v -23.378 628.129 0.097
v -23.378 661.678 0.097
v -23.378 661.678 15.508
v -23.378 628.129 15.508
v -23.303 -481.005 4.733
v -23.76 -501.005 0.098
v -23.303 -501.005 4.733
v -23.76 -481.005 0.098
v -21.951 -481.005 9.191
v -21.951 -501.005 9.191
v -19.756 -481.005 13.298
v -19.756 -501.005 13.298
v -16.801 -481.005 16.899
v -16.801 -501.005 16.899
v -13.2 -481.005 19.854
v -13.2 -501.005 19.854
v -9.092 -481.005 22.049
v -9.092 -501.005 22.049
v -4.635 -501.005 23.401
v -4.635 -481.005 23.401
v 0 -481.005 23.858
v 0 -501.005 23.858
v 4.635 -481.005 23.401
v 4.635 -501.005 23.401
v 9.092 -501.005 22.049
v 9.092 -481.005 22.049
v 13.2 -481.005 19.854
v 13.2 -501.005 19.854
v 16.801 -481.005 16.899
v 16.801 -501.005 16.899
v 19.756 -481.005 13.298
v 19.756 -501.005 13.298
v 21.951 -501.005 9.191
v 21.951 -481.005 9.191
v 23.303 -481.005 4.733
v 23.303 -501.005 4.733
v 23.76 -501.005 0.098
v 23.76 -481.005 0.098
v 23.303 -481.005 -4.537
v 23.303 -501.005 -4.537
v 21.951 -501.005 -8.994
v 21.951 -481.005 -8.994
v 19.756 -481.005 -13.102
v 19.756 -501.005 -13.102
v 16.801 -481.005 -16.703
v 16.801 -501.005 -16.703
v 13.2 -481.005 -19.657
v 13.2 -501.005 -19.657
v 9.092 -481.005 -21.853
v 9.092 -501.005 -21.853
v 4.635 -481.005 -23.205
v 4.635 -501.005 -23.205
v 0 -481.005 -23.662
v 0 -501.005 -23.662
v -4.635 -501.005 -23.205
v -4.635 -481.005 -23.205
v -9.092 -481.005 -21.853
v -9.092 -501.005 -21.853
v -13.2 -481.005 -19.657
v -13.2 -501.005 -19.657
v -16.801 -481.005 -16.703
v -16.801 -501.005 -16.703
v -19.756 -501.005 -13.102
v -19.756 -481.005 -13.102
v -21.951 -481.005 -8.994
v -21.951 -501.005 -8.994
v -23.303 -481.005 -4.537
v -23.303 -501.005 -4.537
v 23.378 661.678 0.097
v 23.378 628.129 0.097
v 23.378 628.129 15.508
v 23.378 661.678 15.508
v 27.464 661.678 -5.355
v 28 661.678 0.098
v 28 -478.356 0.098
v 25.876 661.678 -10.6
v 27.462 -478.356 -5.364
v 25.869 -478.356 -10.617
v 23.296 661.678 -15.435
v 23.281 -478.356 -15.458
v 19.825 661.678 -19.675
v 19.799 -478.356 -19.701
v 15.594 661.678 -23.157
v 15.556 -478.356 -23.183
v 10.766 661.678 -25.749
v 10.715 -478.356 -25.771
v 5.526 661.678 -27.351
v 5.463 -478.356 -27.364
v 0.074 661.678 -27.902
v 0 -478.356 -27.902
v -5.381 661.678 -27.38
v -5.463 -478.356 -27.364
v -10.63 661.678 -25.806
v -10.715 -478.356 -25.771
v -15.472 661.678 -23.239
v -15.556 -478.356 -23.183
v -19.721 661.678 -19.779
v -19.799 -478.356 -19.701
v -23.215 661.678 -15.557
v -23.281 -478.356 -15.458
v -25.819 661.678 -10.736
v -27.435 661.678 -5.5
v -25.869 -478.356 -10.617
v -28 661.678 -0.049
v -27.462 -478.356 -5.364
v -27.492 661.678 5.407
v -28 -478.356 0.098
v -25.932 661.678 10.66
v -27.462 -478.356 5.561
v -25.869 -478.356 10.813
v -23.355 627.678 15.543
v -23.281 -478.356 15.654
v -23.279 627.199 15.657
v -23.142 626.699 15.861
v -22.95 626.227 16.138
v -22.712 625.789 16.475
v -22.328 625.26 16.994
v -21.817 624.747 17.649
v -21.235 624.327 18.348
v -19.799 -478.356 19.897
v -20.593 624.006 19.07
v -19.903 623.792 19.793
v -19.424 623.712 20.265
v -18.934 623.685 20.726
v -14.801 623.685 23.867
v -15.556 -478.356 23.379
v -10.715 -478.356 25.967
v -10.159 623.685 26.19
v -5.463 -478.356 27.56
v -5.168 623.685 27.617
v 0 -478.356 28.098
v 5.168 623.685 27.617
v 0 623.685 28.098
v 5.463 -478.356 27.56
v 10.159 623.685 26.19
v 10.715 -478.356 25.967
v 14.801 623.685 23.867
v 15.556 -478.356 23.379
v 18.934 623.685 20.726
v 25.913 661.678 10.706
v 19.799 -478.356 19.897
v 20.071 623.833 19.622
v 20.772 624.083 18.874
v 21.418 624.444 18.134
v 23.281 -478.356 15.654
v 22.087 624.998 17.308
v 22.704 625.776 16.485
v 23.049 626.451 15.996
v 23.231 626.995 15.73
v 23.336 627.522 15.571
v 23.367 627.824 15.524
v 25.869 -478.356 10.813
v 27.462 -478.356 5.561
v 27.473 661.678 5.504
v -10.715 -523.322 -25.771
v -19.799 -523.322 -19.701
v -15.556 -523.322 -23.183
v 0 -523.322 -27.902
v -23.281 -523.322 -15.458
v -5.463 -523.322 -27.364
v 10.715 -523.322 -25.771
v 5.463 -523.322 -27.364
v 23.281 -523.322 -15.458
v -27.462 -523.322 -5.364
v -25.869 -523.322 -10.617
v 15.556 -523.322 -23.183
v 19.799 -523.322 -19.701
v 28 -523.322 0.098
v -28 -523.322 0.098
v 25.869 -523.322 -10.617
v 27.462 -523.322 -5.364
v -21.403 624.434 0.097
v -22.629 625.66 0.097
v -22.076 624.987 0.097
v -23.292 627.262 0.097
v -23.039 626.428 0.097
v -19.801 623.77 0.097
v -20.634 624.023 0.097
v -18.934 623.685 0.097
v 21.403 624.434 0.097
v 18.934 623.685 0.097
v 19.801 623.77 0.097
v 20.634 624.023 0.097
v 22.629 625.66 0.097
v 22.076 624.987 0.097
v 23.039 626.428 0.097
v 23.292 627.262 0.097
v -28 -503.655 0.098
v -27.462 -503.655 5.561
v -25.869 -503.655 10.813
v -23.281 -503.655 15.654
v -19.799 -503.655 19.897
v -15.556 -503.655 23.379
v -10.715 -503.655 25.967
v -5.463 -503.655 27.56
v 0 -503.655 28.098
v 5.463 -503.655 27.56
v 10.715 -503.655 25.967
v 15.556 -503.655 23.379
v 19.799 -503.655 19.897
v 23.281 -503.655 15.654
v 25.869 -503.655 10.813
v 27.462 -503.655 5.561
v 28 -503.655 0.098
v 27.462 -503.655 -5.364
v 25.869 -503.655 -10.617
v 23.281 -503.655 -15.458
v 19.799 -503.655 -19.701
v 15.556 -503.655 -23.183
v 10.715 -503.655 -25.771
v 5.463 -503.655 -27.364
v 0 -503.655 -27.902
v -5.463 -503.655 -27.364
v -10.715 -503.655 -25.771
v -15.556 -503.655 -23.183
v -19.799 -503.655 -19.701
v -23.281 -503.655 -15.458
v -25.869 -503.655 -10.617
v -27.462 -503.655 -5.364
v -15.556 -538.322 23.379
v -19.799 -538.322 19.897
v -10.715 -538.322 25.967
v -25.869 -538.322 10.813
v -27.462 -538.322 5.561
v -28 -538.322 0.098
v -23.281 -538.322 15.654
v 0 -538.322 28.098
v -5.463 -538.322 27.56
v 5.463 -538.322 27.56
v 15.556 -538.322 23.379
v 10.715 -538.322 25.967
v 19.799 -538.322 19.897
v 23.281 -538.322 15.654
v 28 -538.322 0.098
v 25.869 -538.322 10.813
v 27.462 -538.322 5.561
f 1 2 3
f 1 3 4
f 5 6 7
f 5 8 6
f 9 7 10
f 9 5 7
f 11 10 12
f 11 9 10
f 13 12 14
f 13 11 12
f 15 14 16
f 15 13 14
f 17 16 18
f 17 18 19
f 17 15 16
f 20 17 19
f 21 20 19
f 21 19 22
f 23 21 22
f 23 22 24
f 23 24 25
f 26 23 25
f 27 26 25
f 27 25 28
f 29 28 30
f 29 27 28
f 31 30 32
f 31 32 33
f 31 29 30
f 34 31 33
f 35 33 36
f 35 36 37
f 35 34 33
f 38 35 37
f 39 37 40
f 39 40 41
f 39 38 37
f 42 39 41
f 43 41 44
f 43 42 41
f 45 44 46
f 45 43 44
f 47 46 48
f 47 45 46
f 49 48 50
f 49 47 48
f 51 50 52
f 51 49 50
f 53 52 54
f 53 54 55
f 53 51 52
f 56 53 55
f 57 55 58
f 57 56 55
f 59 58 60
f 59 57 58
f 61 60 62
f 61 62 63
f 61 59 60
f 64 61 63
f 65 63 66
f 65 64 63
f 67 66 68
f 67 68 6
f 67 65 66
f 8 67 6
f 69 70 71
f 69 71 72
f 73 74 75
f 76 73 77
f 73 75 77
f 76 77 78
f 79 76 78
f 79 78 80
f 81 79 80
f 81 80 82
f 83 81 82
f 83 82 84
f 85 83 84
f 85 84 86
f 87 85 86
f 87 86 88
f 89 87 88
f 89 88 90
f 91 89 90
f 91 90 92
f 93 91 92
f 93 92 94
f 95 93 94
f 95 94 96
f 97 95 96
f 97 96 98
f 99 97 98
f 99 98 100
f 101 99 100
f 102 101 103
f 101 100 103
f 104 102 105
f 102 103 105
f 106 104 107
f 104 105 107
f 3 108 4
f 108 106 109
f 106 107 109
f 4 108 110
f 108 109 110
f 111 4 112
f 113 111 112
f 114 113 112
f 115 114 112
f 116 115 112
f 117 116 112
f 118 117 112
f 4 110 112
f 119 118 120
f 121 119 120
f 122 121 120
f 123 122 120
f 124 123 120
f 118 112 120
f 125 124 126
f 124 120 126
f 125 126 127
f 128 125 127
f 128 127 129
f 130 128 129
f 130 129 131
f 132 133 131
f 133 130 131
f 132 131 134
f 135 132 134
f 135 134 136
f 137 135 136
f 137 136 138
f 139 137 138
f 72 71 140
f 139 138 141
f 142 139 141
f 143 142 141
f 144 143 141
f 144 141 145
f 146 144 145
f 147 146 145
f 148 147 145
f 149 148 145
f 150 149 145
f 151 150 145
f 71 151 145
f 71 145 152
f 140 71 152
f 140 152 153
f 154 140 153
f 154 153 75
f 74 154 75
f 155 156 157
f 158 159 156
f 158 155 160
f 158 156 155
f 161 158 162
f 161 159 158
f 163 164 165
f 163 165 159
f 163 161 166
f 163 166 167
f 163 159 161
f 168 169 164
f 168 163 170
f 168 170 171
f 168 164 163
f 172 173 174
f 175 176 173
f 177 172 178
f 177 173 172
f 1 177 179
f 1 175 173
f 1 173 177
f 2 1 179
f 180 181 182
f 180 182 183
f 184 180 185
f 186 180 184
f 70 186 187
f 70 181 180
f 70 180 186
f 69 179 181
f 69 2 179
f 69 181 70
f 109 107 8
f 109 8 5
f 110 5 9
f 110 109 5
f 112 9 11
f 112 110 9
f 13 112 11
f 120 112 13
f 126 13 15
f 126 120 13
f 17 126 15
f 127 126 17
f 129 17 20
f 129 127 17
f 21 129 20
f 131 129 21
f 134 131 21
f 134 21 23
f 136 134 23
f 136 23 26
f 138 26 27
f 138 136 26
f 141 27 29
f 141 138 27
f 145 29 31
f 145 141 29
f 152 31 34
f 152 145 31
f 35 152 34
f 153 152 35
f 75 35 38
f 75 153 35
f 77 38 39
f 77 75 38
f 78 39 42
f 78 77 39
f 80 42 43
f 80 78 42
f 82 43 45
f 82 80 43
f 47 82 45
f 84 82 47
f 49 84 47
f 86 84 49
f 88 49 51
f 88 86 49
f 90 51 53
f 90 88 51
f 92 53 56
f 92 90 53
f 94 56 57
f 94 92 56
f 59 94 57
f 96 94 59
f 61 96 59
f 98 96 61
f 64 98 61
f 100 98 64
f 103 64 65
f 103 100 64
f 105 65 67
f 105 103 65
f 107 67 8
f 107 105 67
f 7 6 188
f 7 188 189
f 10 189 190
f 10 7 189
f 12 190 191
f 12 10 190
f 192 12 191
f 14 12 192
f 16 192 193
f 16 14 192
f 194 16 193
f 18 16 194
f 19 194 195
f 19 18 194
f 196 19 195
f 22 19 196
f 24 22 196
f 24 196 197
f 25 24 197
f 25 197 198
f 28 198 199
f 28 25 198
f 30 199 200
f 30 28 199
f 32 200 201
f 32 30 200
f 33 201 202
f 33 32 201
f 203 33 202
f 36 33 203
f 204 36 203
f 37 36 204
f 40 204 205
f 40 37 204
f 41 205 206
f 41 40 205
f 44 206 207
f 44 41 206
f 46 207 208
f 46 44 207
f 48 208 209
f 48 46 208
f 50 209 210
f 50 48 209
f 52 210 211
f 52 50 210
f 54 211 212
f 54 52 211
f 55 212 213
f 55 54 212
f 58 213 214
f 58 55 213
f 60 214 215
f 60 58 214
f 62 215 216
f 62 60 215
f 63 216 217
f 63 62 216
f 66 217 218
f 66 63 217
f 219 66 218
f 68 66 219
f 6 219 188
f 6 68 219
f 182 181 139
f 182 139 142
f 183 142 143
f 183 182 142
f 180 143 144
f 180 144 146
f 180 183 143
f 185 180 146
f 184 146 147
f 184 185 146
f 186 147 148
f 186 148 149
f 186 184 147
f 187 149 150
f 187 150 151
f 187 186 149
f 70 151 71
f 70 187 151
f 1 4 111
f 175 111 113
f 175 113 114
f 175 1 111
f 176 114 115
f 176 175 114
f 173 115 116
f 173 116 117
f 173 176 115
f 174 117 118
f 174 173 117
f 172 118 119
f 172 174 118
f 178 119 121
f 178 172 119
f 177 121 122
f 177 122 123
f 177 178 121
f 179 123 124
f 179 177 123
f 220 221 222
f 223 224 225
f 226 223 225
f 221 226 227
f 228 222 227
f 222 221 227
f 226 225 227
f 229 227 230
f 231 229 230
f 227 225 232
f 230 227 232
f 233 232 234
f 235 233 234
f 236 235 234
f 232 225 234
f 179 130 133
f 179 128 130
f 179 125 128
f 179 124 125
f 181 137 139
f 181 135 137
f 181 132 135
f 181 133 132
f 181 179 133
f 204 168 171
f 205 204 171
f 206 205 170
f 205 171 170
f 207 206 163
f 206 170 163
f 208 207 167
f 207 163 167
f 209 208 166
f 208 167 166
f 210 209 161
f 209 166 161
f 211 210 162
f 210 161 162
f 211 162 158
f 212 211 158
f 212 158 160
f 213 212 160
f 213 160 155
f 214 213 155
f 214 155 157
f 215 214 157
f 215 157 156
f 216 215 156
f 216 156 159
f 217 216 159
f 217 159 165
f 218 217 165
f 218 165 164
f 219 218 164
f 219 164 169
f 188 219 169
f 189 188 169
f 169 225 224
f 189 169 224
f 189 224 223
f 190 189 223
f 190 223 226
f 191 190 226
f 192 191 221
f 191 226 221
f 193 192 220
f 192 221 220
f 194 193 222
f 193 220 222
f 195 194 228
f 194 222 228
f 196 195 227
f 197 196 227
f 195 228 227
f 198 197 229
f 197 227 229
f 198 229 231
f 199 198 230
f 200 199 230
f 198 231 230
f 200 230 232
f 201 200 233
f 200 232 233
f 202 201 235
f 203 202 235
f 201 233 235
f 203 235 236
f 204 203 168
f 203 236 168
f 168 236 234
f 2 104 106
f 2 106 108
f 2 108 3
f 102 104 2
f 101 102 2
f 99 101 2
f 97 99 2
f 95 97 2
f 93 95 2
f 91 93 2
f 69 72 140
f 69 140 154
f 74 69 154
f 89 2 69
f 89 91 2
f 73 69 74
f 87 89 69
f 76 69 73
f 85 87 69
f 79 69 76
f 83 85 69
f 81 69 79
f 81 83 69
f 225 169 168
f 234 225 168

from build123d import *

# Parameters (mm, degrees)
SKETCH_2_R               = 2.8
EXTRUDE_1_DEPTH          = 120
SKETCH_3_W               = 5.6
SKETCH_3_H               = 1.5
CUT_EXTRUDE_2_DEPTH      = 3.8
CUT_EXTRUDE_6_DEPTH      = 3.8
CUT_EXTRUDE_6_DEPTH_BACK = 0.0001
SCALE_1_SCALE            = 10


with BuildPart() as part:
    # Эскиз2 → Вытянуть1 (new body)
    with BuildSketch(Plane(origin=(0, 0, 0), x_dir=(1, 0, 0), z_dir=(0, 1, 0))):
        Circle(SKETCH_2_R)
    extrude(amount=EXTRUDE_1_DEPTH)

    # Эскиз3 → Вытянуть2 (cut, through all)
    with BuildSketch(Plane.XY):
        with Locations((0, 0.75)):
            Rectangle(SKETCH_3_W, SKETCH_3_H)
    extrude(amount=-CUT_EXTRUDE_2_DEPTH, mode=Mode.SUBTRACT)

    # Эскиз5 → Вырез-Повернуть1 (revolve, cut)
    with BuildSketch(Plane.XY):
        Polygon((-2.375975952, 5.731640408), (-2.8, 5.99660004), (-2.8, 3.466680776), (-2.375975952, 3.731640408), align=None)
    revolve(axis=Axis((0, 0, 0), (0, 1, 0)), mode=Mode.SUBTRACT)

    # Эскиз6 → Вытянуть6 (cut, two sides)
    with BuildSketch(Plane.XY) as cut_extrude_6_sk:
        with BuildLine():
            Line((-2.337778294, 120.351251099), (-2.337778294, 116.645068544))
            ThreePointArc((-2.337778294, 116.645068544), (-2.207612569, 116.330820685), (-1.89336471, 116.20065496))
            Line((-1.89336471, 116.20065496), (1.89336471, 116.20065496))
            ThreePointArc((1.89336471, 116.20065496), (2.207612569, 116.330820685), (2.337778294, 116.645068544))
            Line((2.337778294, 116.645068544), (2.337778294, 120.351251099))
            Line((2.337778294, 120.351251099), (-2.337778294, 120.351251099))
        make_face()
    extrude(amount=CUT_EXTRUDE_6_DEPTH, mode=Mode.SUBTRACT)
    extrude(cut_extrude_6_sk.sketch, amount=-CUT_EXTRUDE_6_DEPTH_BACK, mode=Mode.SUBTRACT)


with BuildPart() as part_1:
    # Масштаб1: scaled about (-2e-09, 59.813507697, -0.010902497)
    add(part.part.scale(SCALE_1_SCALE).moved(Location((1.8e-08, -538.321569273, 0.098122473))))


solid = part_1.part
